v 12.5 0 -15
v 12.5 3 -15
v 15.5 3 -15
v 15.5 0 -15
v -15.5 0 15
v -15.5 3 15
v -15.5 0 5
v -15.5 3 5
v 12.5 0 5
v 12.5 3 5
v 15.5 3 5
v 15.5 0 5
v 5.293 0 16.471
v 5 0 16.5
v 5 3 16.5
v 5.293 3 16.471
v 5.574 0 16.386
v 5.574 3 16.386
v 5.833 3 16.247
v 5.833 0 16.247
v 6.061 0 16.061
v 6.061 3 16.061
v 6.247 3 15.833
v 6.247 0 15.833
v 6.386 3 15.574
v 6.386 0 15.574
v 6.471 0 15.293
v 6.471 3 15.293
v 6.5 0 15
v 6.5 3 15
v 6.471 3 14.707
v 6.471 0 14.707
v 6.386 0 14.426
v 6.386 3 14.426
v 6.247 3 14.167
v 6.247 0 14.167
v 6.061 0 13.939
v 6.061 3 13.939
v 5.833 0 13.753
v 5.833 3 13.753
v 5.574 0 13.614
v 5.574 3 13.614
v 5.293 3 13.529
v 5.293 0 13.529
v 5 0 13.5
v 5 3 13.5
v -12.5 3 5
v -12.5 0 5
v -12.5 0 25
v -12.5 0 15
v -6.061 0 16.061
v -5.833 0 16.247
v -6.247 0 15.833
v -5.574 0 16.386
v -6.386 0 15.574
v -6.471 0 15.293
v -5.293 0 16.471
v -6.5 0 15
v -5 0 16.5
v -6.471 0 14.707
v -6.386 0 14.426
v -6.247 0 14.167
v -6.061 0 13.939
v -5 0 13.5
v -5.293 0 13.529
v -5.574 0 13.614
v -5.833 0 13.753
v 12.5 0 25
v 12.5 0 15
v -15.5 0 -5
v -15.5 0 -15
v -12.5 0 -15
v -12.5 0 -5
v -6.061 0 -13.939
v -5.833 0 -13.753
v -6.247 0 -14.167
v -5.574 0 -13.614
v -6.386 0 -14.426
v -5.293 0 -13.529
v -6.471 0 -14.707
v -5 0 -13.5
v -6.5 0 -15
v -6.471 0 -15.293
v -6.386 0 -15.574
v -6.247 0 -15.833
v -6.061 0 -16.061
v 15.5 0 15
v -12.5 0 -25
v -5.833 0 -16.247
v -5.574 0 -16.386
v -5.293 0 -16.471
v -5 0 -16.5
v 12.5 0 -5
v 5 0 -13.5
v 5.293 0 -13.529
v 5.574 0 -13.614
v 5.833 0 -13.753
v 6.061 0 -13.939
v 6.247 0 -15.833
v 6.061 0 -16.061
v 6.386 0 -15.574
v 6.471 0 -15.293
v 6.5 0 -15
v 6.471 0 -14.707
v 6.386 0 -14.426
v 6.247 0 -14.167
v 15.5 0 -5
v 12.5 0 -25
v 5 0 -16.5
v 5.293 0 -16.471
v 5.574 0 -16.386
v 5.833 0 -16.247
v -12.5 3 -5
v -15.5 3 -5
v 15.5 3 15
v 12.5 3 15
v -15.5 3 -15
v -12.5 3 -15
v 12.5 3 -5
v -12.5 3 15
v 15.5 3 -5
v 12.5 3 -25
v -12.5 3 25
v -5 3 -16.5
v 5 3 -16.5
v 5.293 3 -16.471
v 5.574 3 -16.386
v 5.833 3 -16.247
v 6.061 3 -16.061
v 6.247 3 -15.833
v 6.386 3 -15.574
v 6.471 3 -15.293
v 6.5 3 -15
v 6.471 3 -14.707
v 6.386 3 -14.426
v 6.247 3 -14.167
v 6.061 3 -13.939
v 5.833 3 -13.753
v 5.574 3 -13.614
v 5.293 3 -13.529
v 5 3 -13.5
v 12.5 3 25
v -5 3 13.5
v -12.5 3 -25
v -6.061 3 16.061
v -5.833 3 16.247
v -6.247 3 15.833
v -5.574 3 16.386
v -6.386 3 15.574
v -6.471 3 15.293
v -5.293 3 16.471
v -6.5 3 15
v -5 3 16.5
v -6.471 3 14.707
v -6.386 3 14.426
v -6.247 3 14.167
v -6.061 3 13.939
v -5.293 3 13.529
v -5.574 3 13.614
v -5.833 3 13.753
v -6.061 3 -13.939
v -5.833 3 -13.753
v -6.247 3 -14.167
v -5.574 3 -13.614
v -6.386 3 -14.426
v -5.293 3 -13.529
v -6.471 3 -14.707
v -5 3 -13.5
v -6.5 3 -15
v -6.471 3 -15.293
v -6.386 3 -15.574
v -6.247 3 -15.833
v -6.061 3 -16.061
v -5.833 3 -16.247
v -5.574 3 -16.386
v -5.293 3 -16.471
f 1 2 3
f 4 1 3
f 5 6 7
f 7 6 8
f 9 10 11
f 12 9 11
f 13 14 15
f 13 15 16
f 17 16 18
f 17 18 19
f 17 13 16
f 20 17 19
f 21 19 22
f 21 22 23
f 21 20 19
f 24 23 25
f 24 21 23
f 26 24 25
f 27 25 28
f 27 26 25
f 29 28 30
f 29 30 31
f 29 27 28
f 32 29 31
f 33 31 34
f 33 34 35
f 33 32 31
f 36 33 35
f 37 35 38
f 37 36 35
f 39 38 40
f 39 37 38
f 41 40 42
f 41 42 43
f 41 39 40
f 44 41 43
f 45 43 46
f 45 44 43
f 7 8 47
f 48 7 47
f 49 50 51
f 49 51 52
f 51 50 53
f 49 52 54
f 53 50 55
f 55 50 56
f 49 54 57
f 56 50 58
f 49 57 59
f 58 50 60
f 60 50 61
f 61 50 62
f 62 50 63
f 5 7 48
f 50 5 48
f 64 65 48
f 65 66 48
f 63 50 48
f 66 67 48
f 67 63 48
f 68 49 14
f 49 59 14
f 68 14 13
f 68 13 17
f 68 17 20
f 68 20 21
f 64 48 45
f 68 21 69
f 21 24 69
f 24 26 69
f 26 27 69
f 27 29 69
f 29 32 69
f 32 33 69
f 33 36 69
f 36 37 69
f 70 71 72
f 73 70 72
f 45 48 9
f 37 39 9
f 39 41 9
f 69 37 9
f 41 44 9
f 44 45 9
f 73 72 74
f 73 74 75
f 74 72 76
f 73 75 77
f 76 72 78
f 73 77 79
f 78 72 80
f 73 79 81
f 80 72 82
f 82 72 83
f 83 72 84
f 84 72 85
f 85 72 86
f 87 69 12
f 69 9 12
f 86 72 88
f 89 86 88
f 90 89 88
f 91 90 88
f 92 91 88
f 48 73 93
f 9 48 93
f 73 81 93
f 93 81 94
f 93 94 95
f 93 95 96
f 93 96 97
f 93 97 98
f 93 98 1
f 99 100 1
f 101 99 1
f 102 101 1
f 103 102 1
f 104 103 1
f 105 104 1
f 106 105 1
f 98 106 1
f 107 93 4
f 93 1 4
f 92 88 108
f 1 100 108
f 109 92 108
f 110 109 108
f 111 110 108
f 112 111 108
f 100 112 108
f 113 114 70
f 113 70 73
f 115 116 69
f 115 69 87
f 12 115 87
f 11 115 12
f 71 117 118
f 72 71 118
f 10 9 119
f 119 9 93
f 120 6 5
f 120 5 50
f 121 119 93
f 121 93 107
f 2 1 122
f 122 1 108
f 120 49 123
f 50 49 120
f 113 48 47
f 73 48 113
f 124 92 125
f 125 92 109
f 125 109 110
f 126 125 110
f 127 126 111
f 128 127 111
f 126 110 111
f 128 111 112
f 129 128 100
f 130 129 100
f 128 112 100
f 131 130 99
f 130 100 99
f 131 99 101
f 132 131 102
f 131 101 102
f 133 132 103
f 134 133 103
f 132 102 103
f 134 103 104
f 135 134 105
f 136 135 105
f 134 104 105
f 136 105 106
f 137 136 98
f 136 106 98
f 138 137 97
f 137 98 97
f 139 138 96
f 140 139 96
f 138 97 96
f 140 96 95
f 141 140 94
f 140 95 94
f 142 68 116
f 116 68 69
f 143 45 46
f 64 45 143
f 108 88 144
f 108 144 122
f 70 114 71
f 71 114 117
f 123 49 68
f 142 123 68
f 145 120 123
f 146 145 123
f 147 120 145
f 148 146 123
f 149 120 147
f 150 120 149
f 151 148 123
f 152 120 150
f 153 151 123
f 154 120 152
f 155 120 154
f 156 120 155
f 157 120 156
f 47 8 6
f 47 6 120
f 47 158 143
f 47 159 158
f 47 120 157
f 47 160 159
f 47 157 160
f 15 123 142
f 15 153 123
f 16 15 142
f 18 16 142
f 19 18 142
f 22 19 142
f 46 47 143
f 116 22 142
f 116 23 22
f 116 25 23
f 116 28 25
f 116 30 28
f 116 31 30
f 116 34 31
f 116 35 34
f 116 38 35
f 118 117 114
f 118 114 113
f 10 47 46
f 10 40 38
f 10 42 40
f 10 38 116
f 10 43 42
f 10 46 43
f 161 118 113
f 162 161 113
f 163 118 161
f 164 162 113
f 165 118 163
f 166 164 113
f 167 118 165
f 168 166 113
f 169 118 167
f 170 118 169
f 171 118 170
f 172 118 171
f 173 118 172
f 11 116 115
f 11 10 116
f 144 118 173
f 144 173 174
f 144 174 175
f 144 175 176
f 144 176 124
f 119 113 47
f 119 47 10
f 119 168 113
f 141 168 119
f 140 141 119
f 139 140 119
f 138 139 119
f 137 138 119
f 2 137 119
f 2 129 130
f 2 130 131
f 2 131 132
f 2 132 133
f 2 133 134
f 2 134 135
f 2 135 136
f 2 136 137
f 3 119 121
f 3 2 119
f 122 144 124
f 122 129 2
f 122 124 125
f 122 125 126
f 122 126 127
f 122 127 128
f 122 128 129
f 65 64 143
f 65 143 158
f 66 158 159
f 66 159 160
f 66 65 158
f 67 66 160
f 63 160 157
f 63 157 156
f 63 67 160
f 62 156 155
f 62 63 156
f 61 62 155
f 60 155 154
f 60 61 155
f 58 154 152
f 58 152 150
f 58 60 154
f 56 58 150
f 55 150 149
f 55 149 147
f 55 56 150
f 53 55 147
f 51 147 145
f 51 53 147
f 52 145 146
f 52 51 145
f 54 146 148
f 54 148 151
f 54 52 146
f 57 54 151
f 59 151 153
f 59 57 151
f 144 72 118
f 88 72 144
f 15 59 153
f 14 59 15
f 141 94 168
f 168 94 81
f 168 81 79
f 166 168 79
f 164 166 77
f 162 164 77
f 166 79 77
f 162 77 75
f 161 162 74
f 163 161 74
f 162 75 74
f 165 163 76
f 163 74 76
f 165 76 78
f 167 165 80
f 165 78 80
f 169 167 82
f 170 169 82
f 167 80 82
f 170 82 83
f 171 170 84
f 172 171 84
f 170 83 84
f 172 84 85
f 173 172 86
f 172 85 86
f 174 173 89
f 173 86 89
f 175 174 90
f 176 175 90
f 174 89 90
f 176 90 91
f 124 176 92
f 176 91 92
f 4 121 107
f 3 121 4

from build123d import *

# Parameters (mm, degrees)
SKETCH1_W           = 25
SKETCH1_H           = 50
BOSS_EXTRUDE1_DEPTH = 3
SKETCH2_W           = 3
SKETCH2_H           = 10
BOSS_EXTRUDE2_DEPTH = 3


with BuildPart() as part:
    # Sketch1 → Boss-Extrude1 (new body)
    with BuildSketch(Plane(origin=(0, 0, 0), x_dir=(1, 0, 0), z_dir=(0, 1, 0))):
        Rectangle(SKETCH1_W, SKETCH1_H)
        with BuildLine():
            Line((-5, 16.5), (5, 16.5))
            ThreePointArc((5, 16.5), (6.5, 15), (5, 13.5))
            Line((5, 13.5), (-5, 13.5))
            ThreePointArc((-5, 13.5), (-6.5, 15), (-5, 16.5))
        make_face(mode=Mode.SUBTRACT)
        with BuildLine():
            Line((-5, -16.5), (5, -16.5))
            ThreePointArc((5, -16.5), (6.5, -15), (5, -13.5))
            Line((5, -13.5), (-5, -13.5))
            ThreePointArc((-5, -13.5), (-6.5, -15), (-5, -16.5))
        make_face(mode=Mode.SUBTRACT)
    extrude(amount=BOSS_EXTRUDE1_DEPTH)

    # Sketch2 → Boss-Extrude2 (add)
    with BuildSketch(Plane(origin=(0, 3, 0), x_dir=(1, 0, 0), z_dir=(0, 1, 0))):
        with Locations((14, 10)):
            Rectangle(SKETCH2_W, SKETCH2_H)
        with Locations((14, -10)):
            Rectangle(SKETCH2_W, SKETCH2_H)
        with Locations((-14, -10)):
            Rectangle(SKETCH2_W, SKETCH2_H)
        with Locations((-14, 10)):
            Rectangle(SKETCH2_W, SKETCH2_H)
    extrude(amount=-BOSS_EXTRUDE2_DEPTH)


solid = part.part
